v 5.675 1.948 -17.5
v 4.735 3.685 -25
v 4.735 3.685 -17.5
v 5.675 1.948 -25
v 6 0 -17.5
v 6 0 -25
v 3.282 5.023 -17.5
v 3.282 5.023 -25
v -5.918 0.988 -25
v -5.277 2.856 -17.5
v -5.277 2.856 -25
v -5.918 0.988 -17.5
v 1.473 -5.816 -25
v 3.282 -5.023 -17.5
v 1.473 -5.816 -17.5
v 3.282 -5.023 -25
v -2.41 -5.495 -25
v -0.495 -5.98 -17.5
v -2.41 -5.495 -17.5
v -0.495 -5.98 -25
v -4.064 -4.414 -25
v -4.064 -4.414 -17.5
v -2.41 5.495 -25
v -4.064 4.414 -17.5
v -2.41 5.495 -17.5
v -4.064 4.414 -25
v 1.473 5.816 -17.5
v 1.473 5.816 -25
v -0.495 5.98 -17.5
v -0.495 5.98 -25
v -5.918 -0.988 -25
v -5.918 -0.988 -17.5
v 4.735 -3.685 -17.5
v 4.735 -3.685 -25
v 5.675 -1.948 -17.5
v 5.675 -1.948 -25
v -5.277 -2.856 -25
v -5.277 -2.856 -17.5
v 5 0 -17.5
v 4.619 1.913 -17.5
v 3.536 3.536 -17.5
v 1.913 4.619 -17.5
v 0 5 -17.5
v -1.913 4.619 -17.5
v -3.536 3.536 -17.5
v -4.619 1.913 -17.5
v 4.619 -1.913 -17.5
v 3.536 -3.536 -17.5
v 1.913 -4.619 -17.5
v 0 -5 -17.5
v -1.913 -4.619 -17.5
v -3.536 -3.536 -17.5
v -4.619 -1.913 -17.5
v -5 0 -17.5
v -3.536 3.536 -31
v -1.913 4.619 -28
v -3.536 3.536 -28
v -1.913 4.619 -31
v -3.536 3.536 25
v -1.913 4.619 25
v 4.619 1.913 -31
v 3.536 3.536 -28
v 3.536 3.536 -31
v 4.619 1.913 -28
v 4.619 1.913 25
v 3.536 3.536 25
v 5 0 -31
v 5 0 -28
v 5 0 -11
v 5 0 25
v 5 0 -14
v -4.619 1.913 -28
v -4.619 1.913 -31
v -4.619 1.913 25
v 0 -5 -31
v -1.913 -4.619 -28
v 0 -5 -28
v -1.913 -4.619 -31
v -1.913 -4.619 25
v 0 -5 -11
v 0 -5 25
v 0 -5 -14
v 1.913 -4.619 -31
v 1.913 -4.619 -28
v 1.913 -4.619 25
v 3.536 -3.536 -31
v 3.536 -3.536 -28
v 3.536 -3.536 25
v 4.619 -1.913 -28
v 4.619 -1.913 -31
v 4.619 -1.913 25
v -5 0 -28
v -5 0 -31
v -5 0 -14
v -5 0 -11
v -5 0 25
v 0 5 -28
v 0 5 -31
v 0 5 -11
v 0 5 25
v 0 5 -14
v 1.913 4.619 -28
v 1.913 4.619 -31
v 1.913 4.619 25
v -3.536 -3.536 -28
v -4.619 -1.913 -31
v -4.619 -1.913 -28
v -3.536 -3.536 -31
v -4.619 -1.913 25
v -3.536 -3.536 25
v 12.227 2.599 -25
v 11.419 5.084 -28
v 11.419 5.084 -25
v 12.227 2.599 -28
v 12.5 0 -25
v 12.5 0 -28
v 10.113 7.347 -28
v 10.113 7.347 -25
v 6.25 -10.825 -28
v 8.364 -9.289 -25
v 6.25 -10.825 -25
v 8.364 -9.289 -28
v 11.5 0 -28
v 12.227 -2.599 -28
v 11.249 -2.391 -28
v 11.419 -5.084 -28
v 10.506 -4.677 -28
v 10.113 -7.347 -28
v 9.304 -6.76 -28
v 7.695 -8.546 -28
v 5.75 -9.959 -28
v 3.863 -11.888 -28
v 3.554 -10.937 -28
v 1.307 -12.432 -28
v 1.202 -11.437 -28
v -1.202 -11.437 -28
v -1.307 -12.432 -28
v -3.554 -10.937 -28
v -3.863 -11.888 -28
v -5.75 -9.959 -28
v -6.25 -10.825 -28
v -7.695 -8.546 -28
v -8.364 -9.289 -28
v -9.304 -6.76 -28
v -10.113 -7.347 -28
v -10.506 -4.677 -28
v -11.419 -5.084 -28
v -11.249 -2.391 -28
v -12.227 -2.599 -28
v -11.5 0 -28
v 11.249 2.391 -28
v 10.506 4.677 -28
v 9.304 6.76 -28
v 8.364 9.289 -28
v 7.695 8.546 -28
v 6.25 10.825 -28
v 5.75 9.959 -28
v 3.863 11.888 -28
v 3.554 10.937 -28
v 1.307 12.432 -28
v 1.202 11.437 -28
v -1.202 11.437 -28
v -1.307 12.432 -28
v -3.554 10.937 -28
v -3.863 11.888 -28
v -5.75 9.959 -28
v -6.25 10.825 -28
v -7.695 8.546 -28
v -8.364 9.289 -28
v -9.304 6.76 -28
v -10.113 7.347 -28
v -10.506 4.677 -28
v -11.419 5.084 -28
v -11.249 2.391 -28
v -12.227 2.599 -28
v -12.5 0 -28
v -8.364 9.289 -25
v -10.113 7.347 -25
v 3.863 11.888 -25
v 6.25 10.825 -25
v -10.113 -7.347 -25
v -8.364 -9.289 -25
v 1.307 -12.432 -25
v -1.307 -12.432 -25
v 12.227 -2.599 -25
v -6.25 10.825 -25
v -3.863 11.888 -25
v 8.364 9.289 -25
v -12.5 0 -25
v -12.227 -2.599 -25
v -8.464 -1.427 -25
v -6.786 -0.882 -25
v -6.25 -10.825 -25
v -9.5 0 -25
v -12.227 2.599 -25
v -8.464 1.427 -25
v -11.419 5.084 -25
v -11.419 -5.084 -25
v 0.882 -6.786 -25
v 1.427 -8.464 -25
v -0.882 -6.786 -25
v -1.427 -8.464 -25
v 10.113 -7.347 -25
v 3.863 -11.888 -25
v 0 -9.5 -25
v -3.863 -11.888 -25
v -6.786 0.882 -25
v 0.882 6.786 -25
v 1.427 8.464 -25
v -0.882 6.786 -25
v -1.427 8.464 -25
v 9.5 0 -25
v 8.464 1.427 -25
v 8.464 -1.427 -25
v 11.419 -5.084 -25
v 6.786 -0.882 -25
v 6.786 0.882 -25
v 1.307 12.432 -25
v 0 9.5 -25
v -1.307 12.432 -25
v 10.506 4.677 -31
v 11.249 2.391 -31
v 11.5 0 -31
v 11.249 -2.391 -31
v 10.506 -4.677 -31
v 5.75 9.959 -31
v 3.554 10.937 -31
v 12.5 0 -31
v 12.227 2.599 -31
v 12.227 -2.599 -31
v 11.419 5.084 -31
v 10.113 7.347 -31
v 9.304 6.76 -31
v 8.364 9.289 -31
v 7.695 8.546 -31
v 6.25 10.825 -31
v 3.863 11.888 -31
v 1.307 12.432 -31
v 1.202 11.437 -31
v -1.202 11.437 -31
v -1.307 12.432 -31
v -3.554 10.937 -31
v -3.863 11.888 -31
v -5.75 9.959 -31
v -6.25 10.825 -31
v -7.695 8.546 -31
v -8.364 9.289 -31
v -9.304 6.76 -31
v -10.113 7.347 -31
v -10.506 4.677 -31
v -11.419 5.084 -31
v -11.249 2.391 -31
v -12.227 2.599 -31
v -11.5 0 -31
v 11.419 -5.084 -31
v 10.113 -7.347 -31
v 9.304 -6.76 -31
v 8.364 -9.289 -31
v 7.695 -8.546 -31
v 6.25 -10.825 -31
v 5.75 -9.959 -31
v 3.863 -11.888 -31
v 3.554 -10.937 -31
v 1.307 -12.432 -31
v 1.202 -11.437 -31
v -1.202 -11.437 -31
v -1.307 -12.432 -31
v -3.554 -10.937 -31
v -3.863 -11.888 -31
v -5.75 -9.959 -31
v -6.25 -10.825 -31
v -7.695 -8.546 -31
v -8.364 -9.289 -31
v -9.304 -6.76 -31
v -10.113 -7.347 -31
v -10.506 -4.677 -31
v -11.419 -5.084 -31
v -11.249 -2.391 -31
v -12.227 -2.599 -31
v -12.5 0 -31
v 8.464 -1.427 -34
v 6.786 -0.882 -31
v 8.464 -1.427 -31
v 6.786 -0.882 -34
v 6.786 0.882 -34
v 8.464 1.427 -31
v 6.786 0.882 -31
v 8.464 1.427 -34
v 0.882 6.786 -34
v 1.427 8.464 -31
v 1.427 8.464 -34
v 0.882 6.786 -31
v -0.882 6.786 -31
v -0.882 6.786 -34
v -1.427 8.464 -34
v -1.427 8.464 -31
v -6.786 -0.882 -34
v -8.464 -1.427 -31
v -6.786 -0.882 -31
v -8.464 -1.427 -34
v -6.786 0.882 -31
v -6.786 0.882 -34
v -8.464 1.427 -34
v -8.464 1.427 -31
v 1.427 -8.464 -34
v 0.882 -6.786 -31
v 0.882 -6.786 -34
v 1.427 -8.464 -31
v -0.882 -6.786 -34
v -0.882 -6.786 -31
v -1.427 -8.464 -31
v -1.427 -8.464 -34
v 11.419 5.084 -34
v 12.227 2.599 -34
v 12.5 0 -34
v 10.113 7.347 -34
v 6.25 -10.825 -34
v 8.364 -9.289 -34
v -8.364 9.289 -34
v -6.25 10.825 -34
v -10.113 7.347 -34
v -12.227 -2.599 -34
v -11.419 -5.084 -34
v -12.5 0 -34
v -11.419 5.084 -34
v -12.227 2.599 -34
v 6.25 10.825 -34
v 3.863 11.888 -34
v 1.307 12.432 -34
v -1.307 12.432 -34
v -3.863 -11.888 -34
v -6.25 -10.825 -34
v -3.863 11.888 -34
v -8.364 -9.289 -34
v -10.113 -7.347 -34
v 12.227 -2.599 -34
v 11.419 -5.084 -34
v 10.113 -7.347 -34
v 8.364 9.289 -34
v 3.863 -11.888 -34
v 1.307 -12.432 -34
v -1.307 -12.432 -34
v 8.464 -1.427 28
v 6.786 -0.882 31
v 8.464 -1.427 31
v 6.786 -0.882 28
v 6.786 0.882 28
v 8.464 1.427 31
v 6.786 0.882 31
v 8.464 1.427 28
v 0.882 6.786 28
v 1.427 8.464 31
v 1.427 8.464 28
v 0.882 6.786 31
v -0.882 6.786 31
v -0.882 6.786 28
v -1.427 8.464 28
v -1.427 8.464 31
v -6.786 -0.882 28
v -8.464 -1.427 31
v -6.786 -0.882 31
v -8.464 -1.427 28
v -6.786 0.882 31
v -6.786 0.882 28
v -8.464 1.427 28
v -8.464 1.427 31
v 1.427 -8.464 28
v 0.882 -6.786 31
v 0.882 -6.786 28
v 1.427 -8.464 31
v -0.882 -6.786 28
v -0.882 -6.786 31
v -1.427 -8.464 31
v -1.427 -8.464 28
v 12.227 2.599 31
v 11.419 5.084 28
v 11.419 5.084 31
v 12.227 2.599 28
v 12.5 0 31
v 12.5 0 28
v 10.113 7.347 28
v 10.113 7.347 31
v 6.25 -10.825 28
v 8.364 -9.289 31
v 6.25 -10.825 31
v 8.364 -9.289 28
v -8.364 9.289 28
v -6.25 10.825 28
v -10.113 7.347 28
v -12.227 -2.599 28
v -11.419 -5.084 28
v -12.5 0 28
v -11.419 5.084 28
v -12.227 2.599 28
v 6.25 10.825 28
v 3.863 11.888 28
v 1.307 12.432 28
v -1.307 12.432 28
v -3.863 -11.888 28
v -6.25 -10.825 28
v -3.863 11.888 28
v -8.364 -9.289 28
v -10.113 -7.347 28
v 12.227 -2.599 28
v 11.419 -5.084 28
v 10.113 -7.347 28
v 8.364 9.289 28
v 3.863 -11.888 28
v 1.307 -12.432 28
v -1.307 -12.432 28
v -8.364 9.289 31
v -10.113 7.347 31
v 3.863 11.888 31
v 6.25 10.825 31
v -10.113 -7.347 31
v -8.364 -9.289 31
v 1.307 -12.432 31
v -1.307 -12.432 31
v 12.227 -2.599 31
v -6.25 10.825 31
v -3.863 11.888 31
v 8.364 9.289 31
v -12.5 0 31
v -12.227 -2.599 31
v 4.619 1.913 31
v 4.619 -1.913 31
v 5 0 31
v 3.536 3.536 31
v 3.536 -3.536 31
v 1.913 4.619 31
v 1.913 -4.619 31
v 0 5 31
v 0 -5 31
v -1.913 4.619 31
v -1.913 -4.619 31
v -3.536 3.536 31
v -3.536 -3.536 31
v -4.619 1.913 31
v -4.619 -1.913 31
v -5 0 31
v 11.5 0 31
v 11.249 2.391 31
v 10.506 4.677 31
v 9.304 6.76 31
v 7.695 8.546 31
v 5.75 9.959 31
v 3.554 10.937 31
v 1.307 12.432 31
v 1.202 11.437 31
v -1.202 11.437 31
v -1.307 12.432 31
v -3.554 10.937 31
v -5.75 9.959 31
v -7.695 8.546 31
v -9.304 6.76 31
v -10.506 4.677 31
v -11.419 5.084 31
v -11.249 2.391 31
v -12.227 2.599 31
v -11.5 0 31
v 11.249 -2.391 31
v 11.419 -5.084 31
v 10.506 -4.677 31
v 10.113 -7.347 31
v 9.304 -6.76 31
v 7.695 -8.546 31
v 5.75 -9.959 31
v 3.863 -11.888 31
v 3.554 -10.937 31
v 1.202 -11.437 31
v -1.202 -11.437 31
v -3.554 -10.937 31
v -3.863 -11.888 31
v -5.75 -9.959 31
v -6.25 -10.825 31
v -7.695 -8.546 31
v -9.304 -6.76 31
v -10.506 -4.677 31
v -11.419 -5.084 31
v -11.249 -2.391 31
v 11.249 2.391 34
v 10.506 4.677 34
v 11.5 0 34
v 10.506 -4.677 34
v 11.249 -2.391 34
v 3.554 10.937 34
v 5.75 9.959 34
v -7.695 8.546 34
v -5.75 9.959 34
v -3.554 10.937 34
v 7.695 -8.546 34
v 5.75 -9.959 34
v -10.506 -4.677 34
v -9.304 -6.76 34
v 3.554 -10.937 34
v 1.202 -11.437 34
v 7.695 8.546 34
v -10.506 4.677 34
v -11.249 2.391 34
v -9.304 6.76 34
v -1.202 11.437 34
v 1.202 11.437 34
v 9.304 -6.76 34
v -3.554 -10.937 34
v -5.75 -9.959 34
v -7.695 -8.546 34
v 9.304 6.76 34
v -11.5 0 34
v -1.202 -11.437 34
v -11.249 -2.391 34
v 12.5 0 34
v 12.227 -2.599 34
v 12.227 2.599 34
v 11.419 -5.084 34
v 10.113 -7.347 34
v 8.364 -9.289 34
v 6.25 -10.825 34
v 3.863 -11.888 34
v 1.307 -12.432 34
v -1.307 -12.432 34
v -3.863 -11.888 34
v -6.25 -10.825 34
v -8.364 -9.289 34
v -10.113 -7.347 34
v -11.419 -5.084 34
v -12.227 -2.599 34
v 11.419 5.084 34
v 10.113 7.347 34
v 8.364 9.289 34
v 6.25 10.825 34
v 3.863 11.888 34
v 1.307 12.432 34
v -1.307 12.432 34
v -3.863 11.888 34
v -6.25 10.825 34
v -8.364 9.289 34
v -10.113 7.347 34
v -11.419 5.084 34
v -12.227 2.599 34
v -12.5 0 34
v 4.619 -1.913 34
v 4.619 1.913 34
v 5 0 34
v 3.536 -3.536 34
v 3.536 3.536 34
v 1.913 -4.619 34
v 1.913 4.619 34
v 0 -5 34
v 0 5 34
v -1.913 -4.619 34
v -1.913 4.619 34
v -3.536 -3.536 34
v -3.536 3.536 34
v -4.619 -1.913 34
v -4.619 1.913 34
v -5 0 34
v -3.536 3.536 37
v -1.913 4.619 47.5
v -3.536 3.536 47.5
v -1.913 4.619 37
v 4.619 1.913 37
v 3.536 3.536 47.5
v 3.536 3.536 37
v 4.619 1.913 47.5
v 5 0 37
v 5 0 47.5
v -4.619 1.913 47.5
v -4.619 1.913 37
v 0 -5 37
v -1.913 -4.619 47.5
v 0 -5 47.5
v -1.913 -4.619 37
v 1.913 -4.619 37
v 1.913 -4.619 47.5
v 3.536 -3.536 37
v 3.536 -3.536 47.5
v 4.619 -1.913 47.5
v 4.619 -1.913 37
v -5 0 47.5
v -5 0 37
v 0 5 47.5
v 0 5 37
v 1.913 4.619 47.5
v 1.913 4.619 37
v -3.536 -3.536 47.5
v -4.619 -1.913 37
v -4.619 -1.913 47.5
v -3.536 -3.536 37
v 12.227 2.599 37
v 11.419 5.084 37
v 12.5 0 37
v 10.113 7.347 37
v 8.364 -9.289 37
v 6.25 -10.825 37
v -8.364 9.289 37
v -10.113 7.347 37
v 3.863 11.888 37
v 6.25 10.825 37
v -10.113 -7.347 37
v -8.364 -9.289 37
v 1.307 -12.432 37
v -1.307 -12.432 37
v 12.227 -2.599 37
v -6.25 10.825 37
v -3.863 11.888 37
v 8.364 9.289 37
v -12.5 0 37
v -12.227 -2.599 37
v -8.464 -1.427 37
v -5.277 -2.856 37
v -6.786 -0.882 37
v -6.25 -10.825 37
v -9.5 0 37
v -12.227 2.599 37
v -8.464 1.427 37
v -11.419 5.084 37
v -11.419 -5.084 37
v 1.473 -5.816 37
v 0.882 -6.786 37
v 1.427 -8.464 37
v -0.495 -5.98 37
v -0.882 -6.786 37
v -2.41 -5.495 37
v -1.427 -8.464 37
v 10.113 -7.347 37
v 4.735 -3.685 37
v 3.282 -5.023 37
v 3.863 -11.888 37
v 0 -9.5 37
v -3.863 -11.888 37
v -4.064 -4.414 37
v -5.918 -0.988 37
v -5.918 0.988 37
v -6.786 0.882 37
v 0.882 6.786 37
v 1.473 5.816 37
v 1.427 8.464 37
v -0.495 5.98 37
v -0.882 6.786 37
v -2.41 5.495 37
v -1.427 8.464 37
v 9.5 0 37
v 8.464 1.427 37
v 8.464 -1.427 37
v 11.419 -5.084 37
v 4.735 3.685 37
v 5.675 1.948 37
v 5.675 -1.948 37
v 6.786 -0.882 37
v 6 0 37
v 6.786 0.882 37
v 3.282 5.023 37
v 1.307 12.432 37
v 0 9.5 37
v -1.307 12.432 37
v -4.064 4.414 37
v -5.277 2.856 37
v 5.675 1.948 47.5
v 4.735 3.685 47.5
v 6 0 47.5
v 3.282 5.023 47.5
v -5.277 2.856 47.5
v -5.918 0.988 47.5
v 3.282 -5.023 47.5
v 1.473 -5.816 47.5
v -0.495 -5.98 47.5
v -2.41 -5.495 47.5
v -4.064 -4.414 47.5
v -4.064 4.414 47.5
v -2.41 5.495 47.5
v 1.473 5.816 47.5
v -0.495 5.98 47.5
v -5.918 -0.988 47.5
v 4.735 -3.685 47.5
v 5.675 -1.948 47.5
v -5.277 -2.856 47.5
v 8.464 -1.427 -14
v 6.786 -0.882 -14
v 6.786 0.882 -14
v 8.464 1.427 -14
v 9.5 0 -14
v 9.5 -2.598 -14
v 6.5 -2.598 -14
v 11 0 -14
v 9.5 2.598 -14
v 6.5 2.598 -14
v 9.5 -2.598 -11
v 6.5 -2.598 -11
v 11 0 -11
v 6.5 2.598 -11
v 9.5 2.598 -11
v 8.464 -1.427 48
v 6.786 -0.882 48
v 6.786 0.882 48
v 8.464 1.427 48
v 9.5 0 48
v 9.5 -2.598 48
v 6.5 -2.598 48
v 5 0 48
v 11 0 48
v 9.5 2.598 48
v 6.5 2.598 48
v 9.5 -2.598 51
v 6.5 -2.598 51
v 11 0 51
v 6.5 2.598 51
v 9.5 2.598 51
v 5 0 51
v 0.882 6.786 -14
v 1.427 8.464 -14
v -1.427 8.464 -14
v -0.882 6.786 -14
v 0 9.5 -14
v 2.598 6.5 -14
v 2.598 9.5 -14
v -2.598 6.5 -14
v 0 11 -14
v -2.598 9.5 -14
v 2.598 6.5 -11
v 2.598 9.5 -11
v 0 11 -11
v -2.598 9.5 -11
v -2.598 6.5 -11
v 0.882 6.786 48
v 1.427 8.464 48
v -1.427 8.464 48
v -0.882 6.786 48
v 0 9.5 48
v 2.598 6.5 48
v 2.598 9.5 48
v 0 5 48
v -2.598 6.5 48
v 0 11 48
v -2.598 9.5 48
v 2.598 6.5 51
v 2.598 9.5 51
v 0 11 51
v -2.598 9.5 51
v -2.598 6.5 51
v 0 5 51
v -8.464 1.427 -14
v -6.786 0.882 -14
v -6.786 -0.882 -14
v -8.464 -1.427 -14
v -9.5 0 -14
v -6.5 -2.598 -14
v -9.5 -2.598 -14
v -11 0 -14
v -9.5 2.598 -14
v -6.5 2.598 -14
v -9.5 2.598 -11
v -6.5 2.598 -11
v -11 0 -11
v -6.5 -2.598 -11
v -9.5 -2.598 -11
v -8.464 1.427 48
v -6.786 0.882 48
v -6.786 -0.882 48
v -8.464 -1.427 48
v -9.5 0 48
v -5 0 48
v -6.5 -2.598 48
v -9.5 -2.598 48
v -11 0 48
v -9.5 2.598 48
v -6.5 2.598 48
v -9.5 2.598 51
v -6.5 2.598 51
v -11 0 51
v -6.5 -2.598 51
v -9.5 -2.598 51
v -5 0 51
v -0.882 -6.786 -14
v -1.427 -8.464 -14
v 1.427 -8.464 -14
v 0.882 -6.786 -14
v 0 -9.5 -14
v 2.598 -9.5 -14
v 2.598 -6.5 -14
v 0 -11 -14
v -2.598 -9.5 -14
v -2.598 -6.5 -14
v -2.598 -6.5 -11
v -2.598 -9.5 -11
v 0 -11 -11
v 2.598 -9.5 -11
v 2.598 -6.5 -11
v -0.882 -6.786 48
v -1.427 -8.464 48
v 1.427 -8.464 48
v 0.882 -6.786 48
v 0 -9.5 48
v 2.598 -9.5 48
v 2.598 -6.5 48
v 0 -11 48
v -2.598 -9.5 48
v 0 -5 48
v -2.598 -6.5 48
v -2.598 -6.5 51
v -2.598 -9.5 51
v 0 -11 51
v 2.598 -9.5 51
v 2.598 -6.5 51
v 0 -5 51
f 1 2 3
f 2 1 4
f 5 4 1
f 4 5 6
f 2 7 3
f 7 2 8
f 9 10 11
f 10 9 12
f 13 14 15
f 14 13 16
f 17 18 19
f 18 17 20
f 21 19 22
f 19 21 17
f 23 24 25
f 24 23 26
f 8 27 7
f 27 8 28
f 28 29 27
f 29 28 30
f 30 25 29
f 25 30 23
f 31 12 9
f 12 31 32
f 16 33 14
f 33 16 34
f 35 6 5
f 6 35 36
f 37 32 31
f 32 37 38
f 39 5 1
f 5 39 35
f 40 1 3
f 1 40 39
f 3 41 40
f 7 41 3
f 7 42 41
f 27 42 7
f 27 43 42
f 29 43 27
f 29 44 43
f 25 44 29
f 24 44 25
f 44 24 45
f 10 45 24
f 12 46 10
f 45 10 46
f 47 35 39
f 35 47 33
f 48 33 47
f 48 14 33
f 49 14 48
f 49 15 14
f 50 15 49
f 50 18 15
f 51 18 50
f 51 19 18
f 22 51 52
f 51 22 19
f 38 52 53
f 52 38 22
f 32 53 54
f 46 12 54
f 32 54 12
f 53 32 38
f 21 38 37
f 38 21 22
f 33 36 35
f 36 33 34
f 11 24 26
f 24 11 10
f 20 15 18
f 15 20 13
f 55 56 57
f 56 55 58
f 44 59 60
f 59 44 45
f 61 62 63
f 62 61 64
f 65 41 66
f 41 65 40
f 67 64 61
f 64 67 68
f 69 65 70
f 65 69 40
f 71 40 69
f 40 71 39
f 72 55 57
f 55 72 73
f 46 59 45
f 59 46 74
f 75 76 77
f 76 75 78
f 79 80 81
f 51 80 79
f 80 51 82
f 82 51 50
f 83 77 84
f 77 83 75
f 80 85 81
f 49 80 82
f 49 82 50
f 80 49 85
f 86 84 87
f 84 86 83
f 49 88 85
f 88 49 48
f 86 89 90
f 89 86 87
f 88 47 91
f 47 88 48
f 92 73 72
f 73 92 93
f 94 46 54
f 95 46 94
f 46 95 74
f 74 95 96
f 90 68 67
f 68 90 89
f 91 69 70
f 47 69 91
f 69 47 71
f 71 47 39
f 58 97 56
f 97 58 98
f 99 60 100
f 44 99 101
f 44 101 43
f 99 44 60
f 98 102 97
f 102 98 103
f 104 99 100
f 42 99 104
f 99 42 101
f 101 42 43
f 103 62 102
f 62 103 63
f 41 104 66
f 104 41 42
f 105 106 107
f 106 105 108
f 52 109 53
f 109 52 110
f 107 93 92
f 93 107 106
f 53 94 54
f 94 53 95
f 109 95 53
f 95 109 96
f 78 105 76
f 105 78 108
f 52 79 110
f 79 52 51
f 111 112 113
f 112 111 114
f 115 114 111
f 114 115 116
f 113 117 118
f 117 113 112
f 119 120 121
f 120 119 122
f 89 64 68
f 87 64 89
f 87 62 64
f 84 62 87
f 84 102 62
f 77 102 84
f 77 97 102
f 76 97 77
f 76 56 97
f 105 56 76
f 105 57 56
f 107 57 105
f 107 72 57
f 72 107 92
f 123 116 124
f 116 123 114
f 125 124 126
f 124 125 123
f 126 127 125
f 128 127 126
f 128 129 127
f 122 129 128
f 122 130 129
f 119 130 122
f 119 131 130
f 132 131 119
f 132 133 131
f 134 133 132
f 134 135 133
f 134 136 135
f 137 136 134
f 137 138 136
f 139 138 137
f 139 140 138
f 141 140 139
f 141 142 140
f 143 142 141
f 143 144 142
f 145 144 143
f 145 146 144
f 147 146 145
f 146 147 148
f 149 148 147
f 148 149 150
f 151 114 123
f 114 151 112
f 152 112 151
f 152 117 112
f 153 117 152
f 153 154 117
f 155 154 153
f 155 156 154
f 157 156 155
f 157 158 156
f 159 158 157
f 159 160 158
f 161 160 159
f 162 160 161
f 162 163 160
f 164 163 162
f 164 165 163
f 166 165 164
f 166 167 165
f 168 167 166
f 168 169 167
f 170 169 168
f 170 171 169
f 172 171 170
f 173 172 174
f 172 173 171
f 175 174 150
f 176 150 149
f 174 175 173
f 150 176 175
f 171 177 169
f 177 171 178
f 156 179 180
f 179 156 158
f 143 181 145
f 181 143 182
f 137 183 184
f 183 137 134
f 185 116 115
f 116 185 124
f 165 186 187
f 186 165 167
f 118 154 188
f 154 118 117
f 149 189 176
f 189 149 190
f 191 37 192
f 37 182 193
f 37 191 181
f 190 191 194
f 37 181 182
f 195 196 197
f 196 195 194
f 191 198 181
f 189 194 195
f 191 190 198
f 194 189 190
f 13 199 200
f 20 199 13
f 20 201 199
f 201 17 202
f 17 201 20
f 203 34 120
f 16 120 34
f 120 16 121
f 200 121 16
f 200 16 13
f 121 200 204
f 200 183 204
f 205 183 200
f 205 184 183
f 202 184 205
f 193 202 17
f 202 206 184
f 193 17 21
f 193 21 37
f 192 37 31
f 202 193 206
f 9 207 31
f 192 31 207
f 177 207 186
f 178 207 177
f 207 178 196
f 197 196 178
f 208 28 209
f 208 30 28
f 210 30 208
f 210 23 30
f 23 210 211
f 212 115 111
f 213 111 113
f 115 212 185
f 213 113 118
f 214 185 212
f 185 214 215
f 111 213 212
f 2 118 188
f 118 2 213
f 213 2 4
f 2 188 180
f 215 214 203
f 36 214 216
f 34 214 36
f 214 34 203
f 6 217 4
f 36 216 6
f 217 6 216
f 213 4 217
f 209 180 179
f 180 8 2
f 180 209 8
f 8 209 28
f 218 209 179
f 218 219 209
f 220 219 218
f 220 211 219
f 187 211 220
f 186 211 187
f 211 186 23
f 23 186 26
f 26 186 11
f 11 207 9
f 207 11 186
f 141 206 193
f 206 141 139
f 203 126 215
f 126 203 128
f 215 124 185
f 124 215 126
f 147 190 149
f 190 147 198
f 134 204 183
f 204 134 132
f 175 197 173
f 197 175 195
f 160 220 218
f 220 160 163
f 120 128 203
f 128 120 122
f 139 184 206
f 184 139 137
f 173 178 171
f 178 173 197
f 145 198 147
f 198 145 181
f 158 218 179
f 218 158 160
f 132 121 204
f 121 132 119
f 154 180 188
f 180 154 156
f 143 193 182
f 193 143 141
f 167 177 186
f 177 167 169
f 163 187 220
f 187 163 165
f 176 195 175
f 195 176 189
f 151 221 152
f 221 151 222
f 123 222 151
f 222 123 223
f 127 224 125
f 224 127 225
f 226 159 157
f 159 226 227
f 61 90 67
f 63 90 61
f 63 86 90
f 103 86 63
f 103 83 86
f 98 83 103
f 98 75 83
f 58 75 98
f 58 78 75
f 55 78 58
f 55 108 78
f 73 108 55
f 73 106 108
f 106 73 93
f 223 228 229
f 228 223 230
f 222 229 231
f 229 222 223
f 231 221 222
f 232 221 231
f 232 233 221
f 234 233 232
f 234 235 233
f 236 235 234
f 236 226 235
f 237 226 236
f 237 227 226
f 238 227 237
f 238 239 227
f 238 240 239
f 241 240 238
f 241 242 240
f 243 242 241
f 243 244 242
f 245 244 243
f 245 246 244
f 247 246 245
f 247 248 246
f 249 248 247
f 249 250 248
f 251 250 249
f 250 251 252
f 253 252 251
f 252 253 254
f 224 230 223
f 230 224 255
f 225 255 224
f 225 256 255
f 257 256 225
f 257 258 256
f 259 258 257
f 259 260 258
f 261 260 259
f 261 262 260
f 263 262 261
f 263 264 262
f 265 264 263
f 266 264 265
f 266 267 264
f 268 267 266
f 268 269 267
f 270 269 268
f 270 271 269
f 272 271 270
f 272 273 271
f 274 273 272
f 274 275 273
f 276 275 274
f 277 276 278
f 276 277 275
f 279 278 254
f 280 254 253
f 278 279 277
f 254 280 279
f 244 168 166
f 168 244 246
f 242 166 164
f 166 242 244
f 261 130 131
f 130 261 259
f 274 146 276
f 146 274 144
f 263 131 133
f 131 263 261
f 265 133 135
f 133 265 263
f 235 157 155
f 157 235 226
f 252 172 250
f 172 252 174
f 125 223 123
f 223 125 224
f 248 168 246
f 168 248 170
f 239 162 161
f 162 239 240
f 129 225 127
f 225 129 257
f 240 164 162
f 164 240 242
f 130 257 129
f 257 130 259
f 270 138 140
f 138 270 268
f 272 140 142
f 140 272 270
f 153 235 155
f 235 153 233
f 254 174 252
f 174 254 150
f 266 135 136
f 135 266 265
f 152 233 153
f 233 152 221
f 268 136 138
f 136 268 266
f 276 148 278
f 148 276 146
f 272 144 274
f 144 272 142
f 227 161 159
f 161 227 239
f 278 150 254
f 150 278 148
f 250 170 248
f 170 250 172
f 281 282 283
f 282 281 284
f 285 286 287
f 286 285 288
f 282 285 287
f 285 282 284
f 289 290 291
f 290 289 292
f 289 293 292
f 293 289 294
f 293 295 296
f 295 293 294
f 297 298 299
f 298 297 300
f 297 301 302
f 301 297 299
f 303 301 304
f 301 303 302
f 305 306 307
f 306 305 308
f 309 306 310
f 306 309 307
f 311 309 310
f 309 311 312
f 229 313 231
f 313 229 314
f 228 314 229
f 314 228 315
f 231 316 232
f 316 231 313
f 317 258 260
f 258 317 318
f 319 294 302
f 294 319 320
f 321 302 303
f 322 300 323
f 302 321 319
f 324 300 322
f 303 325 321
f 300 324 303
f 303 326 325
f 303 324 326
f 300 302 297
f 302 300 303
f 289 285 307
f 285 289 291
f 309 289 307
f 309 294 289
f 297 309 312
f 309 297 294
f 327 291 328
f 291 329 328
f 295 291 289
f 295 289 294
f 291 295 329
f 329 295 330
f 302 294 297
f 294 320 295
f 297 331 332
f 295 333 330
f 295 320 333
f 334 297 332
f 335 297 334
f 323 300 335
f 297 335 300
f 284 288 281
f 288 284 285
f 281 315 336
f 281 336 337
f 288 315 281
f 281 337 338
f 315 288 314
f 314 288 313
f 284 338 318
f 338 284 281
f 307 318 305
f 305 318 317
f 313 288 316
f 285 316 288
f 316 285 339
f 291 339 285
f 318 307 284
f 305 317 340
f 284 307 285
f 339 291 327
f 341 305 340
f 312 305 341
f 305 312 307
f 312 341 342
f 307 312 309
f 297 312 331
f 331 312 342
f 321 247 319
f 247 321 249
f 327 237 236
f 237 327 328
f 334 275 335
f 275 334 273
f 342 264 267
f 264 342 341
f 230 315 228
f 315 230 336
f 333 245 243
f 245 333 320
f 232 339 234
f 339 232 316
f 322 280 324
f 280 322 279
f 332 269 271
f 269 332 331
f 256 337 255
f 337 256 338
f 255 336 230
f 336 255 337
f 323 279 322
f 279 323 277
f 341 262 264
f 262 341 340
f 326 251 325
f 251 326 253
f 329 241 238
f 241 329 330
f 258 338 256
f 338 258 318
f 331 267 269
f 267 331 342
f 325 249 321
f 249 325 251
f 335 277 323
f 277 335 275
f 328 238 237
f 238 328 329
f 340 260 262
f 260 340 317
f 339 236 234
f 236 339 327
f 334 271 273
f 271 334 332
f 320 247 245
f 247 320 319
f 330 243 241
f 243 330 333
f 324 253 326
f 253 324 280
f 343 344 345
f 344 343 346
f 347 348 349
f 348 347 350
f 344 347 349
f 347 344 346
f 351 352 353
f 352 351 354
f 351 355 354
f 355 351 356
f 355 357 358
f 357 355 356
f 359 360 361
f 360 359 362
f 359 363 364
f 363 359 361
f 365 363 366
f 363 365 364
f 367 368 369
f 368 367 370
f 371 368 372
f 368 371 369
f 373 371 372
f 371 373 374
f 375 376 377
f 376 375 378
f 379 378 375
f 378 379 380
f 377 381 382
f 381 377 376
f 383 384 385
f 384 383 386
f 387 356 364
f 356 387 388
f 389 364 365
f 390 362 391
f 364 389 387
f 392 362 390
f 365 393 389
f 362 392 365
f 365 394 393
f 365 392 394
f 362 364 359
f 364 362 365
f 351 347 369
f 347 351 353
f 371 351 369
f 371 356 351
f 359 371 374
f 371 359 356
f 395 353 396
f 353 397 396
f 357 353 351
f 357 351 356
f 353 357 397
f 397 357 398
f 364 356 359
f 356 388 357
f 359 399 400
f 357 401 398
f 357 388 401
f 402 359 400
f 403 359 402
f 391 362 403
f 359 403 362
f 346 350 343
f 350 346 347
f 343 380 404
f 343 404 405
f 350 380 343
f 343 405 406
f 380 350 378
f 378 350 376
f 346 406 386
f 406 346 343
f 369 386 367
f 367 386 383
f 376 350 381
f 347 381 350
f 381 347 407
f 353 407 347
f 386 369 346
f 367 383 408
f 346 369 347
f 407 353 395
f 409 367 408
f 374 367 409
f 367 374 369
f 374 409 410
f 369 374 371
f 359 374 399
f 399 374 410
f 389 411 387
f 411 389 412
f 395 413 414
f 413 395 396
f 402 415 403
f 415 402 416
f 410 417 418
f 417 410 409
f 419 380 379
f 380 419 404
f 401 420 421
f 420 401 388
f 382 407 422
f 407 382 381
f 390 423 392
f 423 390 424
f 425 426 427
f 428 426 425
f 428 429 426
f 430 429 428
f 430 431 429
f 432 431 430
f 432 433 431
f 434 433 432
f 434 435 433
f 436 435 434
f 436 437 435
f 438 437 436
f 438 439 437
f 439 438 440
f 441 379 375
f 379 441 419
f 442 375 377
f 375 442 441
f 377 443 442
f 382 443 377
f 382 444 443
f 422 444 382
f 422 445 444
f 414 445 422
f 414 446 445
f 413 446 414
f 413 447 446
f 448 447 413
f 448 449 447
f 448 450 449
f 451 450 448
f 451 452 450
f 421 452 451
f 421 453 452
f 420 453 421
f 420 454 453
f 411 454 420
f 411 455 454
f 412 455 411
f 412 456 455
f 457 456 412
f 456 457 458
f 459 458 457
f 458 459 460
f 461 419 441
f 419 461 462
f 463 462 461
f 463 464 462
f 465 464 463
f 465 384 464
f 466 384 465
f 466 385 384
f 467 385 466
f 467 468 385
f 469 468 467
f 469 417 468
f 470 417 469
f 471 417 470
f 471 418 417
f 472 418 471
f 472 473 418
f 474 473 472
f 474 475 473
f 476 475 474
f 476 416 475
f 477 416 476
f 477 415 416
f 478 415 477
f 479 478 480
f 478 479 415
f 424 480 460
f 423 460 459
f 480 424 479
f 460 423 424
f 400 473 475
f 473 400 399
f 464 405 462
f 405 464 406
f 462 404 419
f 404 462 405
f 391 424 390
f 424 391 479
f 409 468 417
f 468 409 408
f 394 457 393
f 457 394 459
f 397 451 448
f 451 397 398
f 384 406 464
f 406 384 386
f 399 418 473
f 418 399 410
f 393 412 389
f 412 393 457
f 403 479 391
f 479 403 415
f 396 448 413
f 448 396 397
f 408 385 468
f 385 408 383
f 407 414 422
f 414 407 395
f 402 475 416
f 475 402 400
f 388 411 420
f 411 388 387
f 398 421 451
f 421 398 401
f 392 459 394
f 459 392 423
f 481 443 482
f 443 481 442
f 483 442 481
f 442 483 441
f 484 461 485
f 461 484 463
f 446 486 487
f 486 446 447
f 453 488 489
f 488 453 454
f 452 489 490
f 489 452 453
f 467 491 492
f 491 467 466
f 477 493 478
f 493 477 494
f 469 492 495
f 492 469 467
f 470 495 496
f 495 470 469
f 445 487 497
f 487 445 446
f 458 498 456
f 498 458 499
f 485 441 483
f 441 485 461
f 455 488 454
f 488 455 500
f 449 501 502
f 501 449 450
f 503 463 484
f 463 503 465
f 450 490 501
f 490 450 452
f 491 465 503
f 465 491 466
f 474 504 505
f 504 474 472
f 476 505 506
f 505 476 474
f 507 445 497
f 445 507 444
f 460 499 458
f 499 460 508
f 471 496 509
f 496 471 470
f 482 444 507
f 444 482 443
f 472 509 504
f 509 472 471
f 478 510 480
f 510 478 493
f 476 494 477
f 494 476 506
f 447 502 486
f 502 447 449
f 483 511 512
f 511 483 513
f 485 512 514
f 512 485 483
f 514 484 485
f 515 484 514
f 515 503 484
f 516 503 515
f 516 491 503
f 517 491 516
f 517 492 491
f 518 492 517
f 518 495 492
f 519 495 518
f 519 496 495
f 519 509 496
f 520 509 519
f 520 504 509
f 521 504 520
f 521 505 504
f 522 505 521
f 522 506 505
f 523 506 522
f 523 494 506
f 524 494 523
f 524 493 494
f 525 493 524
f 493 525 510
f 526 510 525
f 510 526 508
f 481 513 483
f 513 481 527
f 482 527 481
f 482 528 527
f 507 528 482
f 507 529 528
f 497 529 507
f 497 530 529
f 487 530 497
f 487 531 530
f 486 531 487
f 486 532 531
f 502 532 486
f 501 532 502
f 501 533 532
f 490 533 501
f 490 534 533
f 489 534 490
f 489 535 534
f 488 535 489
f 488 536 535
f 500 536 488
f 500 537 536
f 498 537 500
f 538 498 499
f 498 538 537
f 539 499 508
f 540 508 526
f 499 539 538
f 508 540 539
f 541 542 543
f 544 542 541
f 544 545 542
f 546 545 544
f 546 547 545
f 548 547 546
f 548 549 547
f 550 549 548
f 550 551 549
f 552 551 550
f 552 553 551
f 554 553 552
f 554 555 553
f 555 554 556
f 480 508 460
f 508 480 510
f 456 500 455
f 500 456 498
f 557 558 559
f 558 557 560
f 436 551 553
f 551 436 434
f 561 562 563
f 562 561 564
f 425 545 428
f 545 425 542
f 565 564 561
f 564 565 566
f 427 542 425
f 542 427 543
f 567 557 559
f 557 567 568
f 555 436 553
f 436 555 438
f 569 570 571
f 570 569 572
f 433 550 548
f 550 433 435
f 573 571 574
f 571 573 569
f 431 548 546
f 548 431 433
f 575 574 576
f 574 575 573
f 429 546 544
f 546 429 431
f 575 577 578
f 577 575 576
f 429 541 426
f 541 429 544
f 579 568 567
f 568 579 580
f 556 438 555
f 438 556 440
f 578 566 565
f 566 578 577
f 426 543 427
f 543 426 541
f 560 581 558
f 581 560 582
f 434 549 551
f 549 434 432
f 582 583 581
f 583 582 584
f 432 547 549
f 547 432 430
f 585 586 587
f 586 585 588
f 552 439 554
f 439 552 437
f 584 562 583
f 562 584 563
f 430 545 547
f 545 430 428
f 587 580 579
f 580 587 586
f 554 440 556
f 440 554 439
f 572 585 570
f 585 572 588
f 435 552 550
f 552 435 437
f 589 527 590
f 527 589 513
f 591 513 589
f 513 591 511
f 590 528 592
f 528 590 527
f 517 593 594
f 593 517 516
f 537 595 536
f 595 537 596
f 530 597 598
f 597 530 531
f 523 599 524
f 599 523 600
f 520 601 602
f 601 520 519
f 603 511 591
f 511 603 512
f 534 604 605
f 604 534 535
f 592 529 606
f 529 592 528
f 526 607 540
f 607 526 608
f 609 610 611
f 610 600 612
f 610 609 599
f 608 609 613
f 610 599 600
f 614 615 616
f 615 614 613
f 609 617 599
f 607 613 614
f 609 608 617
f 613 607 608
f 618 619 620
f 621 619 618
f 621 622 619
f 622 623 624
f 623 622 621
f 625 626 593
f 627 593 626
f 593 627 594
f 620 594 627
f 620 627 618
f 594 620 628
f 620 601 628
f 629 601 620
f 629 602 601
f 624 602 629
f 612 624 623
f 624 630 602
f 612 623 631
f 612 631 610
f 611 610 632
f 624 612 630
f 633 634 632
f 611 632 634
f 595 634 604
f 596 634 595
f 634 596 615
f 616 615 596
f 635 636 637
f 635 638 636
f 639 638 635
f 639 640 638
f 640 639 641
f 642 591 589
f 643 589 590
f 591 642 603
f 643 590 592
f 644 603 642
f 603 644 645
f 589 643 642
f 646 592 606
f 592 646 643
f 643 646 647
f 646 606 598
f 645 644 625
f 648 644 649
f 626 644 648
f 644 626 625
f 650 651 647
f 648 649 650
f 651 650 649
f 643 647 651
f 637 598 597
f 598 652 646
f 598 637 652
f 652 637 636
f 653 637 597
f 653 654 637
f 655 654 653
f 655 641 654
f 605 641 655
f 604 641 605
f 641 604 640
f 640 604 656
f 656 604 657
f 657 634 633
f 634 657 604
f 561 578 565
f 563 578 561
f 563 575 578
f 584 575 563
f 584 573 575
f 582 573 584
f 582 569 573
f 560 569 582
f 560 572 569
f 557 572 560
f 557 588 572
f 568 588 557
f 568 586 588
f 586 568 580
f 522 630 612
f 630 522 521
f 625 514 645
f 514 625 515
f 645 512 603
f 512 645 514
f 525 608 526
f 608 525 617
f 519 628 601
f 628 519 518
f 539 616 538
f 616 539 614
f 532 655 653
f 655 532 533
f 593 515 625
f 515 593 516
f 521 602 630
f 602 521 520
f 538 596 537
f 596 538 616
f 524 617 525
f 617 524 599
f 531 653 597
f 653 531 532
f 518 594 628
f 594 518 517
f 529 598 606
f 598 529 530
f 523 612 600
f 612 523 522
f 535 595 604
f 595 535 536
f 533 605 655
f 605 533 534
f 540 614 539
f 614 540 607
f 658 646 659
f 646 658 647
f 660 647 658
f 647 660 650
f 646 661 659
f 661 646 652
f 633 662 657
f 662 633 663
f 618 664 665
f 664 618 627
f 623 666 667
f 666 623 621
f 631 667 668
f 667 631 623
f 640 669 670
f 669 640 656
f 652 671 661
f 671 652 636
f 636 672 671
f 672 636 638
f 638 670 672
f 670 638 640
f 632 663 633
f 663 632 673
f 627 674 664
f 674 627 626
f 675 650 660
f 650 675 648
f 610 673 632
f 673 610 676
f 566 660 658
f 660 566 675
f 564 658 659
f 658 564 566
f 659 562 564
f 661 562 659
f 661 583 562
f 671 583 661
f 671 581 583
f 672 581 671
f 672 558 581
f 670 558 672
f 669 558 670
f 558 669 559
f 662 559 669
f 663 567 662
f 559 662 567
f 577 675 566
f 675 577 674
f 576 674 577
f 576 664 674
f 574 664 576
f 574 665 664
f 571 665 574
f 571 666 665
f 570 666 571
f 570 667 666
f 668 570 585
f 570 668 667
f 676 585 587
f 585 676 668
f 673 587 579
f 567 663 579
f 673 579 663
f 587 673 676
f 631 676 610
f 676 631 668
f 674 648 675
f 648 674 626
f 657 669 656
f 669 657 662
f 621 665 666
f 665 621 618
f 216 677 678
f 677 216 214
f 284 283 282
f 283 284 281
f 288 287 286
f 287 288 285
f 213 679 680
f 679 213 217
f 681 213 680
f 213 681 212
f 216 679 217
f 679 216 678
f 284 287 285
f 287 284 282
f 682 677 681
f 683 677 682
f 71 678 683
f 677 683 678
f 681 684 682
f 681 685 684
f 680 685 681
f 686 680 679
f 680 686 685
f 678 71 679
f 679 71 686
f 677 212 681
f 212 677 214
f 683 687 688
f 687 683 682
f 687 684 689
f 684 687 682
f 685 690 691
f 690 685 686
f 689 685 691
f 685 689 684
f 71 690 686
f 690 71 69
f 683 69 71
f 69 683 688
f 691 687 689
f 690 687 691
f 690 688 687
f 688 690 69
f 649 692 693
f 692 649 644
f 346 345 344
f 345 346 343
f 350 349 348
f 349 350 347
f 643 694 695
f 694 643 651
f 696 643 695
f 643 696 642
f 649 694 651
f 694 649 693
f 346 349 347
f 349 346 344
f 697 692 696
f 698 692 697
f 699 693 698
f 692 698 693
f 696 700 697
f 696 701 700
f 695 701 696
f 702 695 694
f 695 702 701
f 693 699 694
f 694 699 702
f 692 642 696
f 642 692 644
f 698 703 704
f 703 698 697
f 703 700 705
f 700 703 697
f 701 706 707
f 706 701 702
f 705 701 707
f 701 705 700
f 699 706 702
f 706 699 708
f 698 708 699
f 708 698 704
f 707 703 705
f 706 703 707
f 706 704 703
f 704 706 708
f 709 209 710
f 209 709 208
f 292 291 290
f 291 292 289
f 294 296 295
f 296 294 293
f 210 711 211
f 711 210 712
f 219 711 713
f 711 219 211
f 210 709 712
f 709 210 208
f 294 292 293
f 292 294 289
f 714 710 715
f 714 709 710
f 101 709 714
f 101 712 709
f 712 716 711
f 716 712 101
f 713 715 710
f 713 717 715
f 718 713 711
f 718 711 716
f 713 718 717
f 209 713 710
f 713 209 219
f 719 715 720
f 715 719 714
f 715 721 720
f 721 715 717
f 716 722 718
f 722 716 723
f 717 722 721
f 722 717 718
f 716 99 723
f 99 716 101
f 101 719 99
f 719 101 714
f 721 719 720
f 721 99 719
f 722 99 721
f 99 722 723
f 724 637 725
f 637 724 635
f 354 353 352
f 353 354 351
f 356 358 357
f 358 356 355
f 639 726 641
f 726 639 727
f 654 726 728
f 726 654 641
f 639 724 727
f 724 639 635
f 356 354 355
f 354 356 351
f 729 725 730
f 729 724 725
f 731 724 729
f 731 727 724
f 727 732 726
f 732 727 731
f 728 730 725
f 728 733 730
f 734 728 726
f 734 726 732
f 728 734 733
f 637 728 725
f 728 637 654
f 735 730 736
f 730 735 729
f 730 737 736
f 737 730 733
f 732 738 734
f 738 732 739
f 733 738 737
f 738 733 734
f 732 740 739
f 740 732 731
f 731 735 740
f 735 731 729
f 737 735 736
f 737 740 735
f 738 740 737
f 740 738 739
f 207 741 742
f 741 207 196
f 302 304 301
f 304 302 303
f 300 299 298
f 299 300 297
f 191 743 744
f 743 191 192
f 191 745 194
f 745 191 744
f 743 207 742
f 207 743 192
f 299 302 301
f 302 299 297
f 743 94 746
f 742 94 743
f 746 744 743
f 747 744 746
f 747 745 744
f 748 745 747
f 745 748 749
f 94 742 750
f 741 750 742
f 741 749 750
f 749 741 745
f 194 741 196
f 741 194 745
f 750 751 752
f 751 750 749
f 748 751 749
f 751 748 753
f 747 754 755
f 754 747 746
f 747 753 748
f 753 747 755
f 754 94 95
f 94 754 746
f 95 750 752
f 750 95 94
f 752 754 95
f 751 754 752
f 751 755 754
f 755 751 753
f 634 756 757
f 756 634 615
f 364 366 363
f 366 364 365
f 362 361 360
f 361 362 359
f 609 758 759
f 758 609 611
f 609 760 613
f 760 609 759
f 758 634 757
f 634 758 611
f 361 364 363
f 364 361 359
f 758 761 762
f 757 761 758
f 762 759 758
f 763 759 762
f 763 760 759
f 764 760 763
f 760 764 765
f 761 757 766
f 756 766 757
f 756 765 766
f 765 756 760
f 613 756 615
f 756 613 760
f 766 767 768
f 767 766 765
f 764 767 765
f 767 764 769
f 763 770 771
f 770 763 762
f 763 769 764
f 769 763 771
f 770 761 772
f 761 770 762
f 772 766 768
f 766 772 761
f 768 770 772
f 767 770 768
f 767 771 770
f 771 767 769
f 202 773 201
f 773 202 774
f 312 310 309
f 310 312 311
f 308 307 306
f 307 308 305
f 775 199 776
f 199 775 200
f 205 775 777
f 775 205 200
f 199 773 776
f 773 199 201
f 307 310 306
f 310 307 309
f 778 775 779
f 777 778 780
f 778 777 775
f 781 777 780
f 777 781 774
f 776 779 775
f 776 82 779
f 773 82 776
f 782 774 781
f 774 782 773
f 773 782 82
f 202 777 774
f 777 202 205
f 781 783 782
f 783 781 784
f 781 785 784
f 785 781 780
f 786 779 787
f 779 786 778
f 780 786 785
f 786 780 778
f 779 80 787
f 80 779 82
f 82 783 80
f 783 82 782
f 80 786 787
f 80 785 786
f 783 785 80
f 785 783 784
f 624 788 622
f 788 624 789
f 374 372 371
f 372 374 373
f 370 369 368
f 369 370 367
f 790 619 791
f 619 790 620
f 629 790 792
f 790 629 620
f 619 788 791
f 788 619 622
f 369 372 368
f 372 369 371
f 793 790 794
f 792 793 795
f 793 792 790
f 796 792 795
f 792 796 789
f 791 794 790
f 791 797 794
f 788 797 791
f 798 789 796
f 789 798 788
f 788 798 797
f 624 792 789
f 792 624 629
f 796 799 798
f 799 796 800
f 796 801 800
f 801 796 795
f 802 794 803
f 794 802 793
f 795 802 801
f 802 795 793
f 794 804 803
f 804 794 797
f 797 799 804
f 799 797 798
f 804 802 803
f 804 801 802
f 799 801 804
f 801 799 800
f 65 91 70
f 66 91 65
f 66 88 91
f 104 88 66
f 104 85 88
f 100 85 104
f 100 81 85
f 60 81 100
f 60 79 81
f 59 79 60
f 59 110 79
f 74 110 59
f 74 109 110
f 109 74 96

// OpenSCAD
// Parameters
shaft_length = 50;
shaft_diameter = 10;
hub_diameter = 12; // Adjusted to match the original model
hub_length = 15; // Adjusted to match the original model
flange_diameter = 25;
flange_thickness = 3; // Adjusted to match the original model
spacer_diameter = 23;
spacer_thickness = 3; // Adjusted to match the original model
bolt_diameter = 3;
bolt_length = 20;
nut_diameter = 6;
nut_thickness = 3;
bolt_hole_radius = 8;

// Function to create a hub
module hub() {
    difference() {
        cylinder(h = hub_length, d = hub_diameter);
        translate([0, 0, -1]) cylinder(h = hub_length + 2, d = shaft_diameter);
    }
}

// Function to create a flange plate
module flange_plate() {
    difference() {
        cylinder(h = flange_thickness, d = flange_diameter);
        for (i = [0:90:270]) {
            rotate([0, 0, i])
            translate([bolt_hole_radius, 0, -1])
            cylinder(h = flange_thickness + 2, d = bolt_diameter);
        }
    }
}

// Function to create a spacer ring
module spacer_ring() {
    difference() {
        cylinder(h = spacer_thickness, d = spacer_diameter);
        translate([0, 0, -1]) cylinder(h = spacer_thickness + 2, d = shaft_diameter);
    }
}

// Function to create a bolt
module bolt() {
    union() {
        cylinder(h = bolt_length, d = bolt_diameter);
        translate([0, 0, bolt_length]) cylinder(h = nut_thickness, d = nut_diameter, $fn=6);
    }
}

// Function to create a nut
module nut() {
    cylinder(h = nut_thickness, d = nut_diameter, $fn=6);
}

// Assembly
module coupling() {
    // End hub 1
    translate([0, 0, -shaft_length/2 - hub_length/2]) hub();
    
    // Flange plate 1
    translate([0, 0, -shaft_length/2 - flange_thickness]) flange_plate();
    
    // Spacer ring 1
    translate([0, 0, -shaft_length/2 - flange_thickness - spacer_thickness]) spacer_ring();
    
    // Flange plate 2
    translate([0, 0, -shaft_length/2 - flange_thickness - spacer_thickness - flange_thickness]) flange_plate();
    
    // Central shaft
    translate([0, 0, -shaft_length/2]) cylinder(h = shaft_length, d = shaft_diameter);
    
    // Flange plate 3
    translate([0, 0, shaft_length/2 + flange_thickness]) flange_plate();
    
    // Spacer ring 2
    translate([0, 0, shaft_length/2 + flange_thickness + spacer_thickness]) spacer_ring();
    
    // Flange plate 4
    translate([0, 0, shaft_length/2 + flange_thickness + spacer_thickness + flange_thickness]) flange_plate();
    
    // End hub 2
    translate([0, 0, shaft_length/2 + hub_length/2]) hub();
    
    // Bolts and nuts
    for (i = [0:90:270]) {
        rotate([0, 0, i]) {
            translate([bolt_hole_radius, 0, -shaft_length/2 - flange_thickness - spacer_thickness - flange_thickness])
            bolt();
            
            translate([bolt_hole_radius, 0, -shaft_length/2 - flange_thickness])
            nut();
            
            translate([bolt_hole_radius, 0, shaft_length/2 + flange_thickness])
            bolt();
            
            translate([bolt_hole_radius, 0, shaft_length/2 + flange_thickness + spacer_thickness + flange_thickness])
            nut();
        }
    }
}

// Render the coupling
coupling();
